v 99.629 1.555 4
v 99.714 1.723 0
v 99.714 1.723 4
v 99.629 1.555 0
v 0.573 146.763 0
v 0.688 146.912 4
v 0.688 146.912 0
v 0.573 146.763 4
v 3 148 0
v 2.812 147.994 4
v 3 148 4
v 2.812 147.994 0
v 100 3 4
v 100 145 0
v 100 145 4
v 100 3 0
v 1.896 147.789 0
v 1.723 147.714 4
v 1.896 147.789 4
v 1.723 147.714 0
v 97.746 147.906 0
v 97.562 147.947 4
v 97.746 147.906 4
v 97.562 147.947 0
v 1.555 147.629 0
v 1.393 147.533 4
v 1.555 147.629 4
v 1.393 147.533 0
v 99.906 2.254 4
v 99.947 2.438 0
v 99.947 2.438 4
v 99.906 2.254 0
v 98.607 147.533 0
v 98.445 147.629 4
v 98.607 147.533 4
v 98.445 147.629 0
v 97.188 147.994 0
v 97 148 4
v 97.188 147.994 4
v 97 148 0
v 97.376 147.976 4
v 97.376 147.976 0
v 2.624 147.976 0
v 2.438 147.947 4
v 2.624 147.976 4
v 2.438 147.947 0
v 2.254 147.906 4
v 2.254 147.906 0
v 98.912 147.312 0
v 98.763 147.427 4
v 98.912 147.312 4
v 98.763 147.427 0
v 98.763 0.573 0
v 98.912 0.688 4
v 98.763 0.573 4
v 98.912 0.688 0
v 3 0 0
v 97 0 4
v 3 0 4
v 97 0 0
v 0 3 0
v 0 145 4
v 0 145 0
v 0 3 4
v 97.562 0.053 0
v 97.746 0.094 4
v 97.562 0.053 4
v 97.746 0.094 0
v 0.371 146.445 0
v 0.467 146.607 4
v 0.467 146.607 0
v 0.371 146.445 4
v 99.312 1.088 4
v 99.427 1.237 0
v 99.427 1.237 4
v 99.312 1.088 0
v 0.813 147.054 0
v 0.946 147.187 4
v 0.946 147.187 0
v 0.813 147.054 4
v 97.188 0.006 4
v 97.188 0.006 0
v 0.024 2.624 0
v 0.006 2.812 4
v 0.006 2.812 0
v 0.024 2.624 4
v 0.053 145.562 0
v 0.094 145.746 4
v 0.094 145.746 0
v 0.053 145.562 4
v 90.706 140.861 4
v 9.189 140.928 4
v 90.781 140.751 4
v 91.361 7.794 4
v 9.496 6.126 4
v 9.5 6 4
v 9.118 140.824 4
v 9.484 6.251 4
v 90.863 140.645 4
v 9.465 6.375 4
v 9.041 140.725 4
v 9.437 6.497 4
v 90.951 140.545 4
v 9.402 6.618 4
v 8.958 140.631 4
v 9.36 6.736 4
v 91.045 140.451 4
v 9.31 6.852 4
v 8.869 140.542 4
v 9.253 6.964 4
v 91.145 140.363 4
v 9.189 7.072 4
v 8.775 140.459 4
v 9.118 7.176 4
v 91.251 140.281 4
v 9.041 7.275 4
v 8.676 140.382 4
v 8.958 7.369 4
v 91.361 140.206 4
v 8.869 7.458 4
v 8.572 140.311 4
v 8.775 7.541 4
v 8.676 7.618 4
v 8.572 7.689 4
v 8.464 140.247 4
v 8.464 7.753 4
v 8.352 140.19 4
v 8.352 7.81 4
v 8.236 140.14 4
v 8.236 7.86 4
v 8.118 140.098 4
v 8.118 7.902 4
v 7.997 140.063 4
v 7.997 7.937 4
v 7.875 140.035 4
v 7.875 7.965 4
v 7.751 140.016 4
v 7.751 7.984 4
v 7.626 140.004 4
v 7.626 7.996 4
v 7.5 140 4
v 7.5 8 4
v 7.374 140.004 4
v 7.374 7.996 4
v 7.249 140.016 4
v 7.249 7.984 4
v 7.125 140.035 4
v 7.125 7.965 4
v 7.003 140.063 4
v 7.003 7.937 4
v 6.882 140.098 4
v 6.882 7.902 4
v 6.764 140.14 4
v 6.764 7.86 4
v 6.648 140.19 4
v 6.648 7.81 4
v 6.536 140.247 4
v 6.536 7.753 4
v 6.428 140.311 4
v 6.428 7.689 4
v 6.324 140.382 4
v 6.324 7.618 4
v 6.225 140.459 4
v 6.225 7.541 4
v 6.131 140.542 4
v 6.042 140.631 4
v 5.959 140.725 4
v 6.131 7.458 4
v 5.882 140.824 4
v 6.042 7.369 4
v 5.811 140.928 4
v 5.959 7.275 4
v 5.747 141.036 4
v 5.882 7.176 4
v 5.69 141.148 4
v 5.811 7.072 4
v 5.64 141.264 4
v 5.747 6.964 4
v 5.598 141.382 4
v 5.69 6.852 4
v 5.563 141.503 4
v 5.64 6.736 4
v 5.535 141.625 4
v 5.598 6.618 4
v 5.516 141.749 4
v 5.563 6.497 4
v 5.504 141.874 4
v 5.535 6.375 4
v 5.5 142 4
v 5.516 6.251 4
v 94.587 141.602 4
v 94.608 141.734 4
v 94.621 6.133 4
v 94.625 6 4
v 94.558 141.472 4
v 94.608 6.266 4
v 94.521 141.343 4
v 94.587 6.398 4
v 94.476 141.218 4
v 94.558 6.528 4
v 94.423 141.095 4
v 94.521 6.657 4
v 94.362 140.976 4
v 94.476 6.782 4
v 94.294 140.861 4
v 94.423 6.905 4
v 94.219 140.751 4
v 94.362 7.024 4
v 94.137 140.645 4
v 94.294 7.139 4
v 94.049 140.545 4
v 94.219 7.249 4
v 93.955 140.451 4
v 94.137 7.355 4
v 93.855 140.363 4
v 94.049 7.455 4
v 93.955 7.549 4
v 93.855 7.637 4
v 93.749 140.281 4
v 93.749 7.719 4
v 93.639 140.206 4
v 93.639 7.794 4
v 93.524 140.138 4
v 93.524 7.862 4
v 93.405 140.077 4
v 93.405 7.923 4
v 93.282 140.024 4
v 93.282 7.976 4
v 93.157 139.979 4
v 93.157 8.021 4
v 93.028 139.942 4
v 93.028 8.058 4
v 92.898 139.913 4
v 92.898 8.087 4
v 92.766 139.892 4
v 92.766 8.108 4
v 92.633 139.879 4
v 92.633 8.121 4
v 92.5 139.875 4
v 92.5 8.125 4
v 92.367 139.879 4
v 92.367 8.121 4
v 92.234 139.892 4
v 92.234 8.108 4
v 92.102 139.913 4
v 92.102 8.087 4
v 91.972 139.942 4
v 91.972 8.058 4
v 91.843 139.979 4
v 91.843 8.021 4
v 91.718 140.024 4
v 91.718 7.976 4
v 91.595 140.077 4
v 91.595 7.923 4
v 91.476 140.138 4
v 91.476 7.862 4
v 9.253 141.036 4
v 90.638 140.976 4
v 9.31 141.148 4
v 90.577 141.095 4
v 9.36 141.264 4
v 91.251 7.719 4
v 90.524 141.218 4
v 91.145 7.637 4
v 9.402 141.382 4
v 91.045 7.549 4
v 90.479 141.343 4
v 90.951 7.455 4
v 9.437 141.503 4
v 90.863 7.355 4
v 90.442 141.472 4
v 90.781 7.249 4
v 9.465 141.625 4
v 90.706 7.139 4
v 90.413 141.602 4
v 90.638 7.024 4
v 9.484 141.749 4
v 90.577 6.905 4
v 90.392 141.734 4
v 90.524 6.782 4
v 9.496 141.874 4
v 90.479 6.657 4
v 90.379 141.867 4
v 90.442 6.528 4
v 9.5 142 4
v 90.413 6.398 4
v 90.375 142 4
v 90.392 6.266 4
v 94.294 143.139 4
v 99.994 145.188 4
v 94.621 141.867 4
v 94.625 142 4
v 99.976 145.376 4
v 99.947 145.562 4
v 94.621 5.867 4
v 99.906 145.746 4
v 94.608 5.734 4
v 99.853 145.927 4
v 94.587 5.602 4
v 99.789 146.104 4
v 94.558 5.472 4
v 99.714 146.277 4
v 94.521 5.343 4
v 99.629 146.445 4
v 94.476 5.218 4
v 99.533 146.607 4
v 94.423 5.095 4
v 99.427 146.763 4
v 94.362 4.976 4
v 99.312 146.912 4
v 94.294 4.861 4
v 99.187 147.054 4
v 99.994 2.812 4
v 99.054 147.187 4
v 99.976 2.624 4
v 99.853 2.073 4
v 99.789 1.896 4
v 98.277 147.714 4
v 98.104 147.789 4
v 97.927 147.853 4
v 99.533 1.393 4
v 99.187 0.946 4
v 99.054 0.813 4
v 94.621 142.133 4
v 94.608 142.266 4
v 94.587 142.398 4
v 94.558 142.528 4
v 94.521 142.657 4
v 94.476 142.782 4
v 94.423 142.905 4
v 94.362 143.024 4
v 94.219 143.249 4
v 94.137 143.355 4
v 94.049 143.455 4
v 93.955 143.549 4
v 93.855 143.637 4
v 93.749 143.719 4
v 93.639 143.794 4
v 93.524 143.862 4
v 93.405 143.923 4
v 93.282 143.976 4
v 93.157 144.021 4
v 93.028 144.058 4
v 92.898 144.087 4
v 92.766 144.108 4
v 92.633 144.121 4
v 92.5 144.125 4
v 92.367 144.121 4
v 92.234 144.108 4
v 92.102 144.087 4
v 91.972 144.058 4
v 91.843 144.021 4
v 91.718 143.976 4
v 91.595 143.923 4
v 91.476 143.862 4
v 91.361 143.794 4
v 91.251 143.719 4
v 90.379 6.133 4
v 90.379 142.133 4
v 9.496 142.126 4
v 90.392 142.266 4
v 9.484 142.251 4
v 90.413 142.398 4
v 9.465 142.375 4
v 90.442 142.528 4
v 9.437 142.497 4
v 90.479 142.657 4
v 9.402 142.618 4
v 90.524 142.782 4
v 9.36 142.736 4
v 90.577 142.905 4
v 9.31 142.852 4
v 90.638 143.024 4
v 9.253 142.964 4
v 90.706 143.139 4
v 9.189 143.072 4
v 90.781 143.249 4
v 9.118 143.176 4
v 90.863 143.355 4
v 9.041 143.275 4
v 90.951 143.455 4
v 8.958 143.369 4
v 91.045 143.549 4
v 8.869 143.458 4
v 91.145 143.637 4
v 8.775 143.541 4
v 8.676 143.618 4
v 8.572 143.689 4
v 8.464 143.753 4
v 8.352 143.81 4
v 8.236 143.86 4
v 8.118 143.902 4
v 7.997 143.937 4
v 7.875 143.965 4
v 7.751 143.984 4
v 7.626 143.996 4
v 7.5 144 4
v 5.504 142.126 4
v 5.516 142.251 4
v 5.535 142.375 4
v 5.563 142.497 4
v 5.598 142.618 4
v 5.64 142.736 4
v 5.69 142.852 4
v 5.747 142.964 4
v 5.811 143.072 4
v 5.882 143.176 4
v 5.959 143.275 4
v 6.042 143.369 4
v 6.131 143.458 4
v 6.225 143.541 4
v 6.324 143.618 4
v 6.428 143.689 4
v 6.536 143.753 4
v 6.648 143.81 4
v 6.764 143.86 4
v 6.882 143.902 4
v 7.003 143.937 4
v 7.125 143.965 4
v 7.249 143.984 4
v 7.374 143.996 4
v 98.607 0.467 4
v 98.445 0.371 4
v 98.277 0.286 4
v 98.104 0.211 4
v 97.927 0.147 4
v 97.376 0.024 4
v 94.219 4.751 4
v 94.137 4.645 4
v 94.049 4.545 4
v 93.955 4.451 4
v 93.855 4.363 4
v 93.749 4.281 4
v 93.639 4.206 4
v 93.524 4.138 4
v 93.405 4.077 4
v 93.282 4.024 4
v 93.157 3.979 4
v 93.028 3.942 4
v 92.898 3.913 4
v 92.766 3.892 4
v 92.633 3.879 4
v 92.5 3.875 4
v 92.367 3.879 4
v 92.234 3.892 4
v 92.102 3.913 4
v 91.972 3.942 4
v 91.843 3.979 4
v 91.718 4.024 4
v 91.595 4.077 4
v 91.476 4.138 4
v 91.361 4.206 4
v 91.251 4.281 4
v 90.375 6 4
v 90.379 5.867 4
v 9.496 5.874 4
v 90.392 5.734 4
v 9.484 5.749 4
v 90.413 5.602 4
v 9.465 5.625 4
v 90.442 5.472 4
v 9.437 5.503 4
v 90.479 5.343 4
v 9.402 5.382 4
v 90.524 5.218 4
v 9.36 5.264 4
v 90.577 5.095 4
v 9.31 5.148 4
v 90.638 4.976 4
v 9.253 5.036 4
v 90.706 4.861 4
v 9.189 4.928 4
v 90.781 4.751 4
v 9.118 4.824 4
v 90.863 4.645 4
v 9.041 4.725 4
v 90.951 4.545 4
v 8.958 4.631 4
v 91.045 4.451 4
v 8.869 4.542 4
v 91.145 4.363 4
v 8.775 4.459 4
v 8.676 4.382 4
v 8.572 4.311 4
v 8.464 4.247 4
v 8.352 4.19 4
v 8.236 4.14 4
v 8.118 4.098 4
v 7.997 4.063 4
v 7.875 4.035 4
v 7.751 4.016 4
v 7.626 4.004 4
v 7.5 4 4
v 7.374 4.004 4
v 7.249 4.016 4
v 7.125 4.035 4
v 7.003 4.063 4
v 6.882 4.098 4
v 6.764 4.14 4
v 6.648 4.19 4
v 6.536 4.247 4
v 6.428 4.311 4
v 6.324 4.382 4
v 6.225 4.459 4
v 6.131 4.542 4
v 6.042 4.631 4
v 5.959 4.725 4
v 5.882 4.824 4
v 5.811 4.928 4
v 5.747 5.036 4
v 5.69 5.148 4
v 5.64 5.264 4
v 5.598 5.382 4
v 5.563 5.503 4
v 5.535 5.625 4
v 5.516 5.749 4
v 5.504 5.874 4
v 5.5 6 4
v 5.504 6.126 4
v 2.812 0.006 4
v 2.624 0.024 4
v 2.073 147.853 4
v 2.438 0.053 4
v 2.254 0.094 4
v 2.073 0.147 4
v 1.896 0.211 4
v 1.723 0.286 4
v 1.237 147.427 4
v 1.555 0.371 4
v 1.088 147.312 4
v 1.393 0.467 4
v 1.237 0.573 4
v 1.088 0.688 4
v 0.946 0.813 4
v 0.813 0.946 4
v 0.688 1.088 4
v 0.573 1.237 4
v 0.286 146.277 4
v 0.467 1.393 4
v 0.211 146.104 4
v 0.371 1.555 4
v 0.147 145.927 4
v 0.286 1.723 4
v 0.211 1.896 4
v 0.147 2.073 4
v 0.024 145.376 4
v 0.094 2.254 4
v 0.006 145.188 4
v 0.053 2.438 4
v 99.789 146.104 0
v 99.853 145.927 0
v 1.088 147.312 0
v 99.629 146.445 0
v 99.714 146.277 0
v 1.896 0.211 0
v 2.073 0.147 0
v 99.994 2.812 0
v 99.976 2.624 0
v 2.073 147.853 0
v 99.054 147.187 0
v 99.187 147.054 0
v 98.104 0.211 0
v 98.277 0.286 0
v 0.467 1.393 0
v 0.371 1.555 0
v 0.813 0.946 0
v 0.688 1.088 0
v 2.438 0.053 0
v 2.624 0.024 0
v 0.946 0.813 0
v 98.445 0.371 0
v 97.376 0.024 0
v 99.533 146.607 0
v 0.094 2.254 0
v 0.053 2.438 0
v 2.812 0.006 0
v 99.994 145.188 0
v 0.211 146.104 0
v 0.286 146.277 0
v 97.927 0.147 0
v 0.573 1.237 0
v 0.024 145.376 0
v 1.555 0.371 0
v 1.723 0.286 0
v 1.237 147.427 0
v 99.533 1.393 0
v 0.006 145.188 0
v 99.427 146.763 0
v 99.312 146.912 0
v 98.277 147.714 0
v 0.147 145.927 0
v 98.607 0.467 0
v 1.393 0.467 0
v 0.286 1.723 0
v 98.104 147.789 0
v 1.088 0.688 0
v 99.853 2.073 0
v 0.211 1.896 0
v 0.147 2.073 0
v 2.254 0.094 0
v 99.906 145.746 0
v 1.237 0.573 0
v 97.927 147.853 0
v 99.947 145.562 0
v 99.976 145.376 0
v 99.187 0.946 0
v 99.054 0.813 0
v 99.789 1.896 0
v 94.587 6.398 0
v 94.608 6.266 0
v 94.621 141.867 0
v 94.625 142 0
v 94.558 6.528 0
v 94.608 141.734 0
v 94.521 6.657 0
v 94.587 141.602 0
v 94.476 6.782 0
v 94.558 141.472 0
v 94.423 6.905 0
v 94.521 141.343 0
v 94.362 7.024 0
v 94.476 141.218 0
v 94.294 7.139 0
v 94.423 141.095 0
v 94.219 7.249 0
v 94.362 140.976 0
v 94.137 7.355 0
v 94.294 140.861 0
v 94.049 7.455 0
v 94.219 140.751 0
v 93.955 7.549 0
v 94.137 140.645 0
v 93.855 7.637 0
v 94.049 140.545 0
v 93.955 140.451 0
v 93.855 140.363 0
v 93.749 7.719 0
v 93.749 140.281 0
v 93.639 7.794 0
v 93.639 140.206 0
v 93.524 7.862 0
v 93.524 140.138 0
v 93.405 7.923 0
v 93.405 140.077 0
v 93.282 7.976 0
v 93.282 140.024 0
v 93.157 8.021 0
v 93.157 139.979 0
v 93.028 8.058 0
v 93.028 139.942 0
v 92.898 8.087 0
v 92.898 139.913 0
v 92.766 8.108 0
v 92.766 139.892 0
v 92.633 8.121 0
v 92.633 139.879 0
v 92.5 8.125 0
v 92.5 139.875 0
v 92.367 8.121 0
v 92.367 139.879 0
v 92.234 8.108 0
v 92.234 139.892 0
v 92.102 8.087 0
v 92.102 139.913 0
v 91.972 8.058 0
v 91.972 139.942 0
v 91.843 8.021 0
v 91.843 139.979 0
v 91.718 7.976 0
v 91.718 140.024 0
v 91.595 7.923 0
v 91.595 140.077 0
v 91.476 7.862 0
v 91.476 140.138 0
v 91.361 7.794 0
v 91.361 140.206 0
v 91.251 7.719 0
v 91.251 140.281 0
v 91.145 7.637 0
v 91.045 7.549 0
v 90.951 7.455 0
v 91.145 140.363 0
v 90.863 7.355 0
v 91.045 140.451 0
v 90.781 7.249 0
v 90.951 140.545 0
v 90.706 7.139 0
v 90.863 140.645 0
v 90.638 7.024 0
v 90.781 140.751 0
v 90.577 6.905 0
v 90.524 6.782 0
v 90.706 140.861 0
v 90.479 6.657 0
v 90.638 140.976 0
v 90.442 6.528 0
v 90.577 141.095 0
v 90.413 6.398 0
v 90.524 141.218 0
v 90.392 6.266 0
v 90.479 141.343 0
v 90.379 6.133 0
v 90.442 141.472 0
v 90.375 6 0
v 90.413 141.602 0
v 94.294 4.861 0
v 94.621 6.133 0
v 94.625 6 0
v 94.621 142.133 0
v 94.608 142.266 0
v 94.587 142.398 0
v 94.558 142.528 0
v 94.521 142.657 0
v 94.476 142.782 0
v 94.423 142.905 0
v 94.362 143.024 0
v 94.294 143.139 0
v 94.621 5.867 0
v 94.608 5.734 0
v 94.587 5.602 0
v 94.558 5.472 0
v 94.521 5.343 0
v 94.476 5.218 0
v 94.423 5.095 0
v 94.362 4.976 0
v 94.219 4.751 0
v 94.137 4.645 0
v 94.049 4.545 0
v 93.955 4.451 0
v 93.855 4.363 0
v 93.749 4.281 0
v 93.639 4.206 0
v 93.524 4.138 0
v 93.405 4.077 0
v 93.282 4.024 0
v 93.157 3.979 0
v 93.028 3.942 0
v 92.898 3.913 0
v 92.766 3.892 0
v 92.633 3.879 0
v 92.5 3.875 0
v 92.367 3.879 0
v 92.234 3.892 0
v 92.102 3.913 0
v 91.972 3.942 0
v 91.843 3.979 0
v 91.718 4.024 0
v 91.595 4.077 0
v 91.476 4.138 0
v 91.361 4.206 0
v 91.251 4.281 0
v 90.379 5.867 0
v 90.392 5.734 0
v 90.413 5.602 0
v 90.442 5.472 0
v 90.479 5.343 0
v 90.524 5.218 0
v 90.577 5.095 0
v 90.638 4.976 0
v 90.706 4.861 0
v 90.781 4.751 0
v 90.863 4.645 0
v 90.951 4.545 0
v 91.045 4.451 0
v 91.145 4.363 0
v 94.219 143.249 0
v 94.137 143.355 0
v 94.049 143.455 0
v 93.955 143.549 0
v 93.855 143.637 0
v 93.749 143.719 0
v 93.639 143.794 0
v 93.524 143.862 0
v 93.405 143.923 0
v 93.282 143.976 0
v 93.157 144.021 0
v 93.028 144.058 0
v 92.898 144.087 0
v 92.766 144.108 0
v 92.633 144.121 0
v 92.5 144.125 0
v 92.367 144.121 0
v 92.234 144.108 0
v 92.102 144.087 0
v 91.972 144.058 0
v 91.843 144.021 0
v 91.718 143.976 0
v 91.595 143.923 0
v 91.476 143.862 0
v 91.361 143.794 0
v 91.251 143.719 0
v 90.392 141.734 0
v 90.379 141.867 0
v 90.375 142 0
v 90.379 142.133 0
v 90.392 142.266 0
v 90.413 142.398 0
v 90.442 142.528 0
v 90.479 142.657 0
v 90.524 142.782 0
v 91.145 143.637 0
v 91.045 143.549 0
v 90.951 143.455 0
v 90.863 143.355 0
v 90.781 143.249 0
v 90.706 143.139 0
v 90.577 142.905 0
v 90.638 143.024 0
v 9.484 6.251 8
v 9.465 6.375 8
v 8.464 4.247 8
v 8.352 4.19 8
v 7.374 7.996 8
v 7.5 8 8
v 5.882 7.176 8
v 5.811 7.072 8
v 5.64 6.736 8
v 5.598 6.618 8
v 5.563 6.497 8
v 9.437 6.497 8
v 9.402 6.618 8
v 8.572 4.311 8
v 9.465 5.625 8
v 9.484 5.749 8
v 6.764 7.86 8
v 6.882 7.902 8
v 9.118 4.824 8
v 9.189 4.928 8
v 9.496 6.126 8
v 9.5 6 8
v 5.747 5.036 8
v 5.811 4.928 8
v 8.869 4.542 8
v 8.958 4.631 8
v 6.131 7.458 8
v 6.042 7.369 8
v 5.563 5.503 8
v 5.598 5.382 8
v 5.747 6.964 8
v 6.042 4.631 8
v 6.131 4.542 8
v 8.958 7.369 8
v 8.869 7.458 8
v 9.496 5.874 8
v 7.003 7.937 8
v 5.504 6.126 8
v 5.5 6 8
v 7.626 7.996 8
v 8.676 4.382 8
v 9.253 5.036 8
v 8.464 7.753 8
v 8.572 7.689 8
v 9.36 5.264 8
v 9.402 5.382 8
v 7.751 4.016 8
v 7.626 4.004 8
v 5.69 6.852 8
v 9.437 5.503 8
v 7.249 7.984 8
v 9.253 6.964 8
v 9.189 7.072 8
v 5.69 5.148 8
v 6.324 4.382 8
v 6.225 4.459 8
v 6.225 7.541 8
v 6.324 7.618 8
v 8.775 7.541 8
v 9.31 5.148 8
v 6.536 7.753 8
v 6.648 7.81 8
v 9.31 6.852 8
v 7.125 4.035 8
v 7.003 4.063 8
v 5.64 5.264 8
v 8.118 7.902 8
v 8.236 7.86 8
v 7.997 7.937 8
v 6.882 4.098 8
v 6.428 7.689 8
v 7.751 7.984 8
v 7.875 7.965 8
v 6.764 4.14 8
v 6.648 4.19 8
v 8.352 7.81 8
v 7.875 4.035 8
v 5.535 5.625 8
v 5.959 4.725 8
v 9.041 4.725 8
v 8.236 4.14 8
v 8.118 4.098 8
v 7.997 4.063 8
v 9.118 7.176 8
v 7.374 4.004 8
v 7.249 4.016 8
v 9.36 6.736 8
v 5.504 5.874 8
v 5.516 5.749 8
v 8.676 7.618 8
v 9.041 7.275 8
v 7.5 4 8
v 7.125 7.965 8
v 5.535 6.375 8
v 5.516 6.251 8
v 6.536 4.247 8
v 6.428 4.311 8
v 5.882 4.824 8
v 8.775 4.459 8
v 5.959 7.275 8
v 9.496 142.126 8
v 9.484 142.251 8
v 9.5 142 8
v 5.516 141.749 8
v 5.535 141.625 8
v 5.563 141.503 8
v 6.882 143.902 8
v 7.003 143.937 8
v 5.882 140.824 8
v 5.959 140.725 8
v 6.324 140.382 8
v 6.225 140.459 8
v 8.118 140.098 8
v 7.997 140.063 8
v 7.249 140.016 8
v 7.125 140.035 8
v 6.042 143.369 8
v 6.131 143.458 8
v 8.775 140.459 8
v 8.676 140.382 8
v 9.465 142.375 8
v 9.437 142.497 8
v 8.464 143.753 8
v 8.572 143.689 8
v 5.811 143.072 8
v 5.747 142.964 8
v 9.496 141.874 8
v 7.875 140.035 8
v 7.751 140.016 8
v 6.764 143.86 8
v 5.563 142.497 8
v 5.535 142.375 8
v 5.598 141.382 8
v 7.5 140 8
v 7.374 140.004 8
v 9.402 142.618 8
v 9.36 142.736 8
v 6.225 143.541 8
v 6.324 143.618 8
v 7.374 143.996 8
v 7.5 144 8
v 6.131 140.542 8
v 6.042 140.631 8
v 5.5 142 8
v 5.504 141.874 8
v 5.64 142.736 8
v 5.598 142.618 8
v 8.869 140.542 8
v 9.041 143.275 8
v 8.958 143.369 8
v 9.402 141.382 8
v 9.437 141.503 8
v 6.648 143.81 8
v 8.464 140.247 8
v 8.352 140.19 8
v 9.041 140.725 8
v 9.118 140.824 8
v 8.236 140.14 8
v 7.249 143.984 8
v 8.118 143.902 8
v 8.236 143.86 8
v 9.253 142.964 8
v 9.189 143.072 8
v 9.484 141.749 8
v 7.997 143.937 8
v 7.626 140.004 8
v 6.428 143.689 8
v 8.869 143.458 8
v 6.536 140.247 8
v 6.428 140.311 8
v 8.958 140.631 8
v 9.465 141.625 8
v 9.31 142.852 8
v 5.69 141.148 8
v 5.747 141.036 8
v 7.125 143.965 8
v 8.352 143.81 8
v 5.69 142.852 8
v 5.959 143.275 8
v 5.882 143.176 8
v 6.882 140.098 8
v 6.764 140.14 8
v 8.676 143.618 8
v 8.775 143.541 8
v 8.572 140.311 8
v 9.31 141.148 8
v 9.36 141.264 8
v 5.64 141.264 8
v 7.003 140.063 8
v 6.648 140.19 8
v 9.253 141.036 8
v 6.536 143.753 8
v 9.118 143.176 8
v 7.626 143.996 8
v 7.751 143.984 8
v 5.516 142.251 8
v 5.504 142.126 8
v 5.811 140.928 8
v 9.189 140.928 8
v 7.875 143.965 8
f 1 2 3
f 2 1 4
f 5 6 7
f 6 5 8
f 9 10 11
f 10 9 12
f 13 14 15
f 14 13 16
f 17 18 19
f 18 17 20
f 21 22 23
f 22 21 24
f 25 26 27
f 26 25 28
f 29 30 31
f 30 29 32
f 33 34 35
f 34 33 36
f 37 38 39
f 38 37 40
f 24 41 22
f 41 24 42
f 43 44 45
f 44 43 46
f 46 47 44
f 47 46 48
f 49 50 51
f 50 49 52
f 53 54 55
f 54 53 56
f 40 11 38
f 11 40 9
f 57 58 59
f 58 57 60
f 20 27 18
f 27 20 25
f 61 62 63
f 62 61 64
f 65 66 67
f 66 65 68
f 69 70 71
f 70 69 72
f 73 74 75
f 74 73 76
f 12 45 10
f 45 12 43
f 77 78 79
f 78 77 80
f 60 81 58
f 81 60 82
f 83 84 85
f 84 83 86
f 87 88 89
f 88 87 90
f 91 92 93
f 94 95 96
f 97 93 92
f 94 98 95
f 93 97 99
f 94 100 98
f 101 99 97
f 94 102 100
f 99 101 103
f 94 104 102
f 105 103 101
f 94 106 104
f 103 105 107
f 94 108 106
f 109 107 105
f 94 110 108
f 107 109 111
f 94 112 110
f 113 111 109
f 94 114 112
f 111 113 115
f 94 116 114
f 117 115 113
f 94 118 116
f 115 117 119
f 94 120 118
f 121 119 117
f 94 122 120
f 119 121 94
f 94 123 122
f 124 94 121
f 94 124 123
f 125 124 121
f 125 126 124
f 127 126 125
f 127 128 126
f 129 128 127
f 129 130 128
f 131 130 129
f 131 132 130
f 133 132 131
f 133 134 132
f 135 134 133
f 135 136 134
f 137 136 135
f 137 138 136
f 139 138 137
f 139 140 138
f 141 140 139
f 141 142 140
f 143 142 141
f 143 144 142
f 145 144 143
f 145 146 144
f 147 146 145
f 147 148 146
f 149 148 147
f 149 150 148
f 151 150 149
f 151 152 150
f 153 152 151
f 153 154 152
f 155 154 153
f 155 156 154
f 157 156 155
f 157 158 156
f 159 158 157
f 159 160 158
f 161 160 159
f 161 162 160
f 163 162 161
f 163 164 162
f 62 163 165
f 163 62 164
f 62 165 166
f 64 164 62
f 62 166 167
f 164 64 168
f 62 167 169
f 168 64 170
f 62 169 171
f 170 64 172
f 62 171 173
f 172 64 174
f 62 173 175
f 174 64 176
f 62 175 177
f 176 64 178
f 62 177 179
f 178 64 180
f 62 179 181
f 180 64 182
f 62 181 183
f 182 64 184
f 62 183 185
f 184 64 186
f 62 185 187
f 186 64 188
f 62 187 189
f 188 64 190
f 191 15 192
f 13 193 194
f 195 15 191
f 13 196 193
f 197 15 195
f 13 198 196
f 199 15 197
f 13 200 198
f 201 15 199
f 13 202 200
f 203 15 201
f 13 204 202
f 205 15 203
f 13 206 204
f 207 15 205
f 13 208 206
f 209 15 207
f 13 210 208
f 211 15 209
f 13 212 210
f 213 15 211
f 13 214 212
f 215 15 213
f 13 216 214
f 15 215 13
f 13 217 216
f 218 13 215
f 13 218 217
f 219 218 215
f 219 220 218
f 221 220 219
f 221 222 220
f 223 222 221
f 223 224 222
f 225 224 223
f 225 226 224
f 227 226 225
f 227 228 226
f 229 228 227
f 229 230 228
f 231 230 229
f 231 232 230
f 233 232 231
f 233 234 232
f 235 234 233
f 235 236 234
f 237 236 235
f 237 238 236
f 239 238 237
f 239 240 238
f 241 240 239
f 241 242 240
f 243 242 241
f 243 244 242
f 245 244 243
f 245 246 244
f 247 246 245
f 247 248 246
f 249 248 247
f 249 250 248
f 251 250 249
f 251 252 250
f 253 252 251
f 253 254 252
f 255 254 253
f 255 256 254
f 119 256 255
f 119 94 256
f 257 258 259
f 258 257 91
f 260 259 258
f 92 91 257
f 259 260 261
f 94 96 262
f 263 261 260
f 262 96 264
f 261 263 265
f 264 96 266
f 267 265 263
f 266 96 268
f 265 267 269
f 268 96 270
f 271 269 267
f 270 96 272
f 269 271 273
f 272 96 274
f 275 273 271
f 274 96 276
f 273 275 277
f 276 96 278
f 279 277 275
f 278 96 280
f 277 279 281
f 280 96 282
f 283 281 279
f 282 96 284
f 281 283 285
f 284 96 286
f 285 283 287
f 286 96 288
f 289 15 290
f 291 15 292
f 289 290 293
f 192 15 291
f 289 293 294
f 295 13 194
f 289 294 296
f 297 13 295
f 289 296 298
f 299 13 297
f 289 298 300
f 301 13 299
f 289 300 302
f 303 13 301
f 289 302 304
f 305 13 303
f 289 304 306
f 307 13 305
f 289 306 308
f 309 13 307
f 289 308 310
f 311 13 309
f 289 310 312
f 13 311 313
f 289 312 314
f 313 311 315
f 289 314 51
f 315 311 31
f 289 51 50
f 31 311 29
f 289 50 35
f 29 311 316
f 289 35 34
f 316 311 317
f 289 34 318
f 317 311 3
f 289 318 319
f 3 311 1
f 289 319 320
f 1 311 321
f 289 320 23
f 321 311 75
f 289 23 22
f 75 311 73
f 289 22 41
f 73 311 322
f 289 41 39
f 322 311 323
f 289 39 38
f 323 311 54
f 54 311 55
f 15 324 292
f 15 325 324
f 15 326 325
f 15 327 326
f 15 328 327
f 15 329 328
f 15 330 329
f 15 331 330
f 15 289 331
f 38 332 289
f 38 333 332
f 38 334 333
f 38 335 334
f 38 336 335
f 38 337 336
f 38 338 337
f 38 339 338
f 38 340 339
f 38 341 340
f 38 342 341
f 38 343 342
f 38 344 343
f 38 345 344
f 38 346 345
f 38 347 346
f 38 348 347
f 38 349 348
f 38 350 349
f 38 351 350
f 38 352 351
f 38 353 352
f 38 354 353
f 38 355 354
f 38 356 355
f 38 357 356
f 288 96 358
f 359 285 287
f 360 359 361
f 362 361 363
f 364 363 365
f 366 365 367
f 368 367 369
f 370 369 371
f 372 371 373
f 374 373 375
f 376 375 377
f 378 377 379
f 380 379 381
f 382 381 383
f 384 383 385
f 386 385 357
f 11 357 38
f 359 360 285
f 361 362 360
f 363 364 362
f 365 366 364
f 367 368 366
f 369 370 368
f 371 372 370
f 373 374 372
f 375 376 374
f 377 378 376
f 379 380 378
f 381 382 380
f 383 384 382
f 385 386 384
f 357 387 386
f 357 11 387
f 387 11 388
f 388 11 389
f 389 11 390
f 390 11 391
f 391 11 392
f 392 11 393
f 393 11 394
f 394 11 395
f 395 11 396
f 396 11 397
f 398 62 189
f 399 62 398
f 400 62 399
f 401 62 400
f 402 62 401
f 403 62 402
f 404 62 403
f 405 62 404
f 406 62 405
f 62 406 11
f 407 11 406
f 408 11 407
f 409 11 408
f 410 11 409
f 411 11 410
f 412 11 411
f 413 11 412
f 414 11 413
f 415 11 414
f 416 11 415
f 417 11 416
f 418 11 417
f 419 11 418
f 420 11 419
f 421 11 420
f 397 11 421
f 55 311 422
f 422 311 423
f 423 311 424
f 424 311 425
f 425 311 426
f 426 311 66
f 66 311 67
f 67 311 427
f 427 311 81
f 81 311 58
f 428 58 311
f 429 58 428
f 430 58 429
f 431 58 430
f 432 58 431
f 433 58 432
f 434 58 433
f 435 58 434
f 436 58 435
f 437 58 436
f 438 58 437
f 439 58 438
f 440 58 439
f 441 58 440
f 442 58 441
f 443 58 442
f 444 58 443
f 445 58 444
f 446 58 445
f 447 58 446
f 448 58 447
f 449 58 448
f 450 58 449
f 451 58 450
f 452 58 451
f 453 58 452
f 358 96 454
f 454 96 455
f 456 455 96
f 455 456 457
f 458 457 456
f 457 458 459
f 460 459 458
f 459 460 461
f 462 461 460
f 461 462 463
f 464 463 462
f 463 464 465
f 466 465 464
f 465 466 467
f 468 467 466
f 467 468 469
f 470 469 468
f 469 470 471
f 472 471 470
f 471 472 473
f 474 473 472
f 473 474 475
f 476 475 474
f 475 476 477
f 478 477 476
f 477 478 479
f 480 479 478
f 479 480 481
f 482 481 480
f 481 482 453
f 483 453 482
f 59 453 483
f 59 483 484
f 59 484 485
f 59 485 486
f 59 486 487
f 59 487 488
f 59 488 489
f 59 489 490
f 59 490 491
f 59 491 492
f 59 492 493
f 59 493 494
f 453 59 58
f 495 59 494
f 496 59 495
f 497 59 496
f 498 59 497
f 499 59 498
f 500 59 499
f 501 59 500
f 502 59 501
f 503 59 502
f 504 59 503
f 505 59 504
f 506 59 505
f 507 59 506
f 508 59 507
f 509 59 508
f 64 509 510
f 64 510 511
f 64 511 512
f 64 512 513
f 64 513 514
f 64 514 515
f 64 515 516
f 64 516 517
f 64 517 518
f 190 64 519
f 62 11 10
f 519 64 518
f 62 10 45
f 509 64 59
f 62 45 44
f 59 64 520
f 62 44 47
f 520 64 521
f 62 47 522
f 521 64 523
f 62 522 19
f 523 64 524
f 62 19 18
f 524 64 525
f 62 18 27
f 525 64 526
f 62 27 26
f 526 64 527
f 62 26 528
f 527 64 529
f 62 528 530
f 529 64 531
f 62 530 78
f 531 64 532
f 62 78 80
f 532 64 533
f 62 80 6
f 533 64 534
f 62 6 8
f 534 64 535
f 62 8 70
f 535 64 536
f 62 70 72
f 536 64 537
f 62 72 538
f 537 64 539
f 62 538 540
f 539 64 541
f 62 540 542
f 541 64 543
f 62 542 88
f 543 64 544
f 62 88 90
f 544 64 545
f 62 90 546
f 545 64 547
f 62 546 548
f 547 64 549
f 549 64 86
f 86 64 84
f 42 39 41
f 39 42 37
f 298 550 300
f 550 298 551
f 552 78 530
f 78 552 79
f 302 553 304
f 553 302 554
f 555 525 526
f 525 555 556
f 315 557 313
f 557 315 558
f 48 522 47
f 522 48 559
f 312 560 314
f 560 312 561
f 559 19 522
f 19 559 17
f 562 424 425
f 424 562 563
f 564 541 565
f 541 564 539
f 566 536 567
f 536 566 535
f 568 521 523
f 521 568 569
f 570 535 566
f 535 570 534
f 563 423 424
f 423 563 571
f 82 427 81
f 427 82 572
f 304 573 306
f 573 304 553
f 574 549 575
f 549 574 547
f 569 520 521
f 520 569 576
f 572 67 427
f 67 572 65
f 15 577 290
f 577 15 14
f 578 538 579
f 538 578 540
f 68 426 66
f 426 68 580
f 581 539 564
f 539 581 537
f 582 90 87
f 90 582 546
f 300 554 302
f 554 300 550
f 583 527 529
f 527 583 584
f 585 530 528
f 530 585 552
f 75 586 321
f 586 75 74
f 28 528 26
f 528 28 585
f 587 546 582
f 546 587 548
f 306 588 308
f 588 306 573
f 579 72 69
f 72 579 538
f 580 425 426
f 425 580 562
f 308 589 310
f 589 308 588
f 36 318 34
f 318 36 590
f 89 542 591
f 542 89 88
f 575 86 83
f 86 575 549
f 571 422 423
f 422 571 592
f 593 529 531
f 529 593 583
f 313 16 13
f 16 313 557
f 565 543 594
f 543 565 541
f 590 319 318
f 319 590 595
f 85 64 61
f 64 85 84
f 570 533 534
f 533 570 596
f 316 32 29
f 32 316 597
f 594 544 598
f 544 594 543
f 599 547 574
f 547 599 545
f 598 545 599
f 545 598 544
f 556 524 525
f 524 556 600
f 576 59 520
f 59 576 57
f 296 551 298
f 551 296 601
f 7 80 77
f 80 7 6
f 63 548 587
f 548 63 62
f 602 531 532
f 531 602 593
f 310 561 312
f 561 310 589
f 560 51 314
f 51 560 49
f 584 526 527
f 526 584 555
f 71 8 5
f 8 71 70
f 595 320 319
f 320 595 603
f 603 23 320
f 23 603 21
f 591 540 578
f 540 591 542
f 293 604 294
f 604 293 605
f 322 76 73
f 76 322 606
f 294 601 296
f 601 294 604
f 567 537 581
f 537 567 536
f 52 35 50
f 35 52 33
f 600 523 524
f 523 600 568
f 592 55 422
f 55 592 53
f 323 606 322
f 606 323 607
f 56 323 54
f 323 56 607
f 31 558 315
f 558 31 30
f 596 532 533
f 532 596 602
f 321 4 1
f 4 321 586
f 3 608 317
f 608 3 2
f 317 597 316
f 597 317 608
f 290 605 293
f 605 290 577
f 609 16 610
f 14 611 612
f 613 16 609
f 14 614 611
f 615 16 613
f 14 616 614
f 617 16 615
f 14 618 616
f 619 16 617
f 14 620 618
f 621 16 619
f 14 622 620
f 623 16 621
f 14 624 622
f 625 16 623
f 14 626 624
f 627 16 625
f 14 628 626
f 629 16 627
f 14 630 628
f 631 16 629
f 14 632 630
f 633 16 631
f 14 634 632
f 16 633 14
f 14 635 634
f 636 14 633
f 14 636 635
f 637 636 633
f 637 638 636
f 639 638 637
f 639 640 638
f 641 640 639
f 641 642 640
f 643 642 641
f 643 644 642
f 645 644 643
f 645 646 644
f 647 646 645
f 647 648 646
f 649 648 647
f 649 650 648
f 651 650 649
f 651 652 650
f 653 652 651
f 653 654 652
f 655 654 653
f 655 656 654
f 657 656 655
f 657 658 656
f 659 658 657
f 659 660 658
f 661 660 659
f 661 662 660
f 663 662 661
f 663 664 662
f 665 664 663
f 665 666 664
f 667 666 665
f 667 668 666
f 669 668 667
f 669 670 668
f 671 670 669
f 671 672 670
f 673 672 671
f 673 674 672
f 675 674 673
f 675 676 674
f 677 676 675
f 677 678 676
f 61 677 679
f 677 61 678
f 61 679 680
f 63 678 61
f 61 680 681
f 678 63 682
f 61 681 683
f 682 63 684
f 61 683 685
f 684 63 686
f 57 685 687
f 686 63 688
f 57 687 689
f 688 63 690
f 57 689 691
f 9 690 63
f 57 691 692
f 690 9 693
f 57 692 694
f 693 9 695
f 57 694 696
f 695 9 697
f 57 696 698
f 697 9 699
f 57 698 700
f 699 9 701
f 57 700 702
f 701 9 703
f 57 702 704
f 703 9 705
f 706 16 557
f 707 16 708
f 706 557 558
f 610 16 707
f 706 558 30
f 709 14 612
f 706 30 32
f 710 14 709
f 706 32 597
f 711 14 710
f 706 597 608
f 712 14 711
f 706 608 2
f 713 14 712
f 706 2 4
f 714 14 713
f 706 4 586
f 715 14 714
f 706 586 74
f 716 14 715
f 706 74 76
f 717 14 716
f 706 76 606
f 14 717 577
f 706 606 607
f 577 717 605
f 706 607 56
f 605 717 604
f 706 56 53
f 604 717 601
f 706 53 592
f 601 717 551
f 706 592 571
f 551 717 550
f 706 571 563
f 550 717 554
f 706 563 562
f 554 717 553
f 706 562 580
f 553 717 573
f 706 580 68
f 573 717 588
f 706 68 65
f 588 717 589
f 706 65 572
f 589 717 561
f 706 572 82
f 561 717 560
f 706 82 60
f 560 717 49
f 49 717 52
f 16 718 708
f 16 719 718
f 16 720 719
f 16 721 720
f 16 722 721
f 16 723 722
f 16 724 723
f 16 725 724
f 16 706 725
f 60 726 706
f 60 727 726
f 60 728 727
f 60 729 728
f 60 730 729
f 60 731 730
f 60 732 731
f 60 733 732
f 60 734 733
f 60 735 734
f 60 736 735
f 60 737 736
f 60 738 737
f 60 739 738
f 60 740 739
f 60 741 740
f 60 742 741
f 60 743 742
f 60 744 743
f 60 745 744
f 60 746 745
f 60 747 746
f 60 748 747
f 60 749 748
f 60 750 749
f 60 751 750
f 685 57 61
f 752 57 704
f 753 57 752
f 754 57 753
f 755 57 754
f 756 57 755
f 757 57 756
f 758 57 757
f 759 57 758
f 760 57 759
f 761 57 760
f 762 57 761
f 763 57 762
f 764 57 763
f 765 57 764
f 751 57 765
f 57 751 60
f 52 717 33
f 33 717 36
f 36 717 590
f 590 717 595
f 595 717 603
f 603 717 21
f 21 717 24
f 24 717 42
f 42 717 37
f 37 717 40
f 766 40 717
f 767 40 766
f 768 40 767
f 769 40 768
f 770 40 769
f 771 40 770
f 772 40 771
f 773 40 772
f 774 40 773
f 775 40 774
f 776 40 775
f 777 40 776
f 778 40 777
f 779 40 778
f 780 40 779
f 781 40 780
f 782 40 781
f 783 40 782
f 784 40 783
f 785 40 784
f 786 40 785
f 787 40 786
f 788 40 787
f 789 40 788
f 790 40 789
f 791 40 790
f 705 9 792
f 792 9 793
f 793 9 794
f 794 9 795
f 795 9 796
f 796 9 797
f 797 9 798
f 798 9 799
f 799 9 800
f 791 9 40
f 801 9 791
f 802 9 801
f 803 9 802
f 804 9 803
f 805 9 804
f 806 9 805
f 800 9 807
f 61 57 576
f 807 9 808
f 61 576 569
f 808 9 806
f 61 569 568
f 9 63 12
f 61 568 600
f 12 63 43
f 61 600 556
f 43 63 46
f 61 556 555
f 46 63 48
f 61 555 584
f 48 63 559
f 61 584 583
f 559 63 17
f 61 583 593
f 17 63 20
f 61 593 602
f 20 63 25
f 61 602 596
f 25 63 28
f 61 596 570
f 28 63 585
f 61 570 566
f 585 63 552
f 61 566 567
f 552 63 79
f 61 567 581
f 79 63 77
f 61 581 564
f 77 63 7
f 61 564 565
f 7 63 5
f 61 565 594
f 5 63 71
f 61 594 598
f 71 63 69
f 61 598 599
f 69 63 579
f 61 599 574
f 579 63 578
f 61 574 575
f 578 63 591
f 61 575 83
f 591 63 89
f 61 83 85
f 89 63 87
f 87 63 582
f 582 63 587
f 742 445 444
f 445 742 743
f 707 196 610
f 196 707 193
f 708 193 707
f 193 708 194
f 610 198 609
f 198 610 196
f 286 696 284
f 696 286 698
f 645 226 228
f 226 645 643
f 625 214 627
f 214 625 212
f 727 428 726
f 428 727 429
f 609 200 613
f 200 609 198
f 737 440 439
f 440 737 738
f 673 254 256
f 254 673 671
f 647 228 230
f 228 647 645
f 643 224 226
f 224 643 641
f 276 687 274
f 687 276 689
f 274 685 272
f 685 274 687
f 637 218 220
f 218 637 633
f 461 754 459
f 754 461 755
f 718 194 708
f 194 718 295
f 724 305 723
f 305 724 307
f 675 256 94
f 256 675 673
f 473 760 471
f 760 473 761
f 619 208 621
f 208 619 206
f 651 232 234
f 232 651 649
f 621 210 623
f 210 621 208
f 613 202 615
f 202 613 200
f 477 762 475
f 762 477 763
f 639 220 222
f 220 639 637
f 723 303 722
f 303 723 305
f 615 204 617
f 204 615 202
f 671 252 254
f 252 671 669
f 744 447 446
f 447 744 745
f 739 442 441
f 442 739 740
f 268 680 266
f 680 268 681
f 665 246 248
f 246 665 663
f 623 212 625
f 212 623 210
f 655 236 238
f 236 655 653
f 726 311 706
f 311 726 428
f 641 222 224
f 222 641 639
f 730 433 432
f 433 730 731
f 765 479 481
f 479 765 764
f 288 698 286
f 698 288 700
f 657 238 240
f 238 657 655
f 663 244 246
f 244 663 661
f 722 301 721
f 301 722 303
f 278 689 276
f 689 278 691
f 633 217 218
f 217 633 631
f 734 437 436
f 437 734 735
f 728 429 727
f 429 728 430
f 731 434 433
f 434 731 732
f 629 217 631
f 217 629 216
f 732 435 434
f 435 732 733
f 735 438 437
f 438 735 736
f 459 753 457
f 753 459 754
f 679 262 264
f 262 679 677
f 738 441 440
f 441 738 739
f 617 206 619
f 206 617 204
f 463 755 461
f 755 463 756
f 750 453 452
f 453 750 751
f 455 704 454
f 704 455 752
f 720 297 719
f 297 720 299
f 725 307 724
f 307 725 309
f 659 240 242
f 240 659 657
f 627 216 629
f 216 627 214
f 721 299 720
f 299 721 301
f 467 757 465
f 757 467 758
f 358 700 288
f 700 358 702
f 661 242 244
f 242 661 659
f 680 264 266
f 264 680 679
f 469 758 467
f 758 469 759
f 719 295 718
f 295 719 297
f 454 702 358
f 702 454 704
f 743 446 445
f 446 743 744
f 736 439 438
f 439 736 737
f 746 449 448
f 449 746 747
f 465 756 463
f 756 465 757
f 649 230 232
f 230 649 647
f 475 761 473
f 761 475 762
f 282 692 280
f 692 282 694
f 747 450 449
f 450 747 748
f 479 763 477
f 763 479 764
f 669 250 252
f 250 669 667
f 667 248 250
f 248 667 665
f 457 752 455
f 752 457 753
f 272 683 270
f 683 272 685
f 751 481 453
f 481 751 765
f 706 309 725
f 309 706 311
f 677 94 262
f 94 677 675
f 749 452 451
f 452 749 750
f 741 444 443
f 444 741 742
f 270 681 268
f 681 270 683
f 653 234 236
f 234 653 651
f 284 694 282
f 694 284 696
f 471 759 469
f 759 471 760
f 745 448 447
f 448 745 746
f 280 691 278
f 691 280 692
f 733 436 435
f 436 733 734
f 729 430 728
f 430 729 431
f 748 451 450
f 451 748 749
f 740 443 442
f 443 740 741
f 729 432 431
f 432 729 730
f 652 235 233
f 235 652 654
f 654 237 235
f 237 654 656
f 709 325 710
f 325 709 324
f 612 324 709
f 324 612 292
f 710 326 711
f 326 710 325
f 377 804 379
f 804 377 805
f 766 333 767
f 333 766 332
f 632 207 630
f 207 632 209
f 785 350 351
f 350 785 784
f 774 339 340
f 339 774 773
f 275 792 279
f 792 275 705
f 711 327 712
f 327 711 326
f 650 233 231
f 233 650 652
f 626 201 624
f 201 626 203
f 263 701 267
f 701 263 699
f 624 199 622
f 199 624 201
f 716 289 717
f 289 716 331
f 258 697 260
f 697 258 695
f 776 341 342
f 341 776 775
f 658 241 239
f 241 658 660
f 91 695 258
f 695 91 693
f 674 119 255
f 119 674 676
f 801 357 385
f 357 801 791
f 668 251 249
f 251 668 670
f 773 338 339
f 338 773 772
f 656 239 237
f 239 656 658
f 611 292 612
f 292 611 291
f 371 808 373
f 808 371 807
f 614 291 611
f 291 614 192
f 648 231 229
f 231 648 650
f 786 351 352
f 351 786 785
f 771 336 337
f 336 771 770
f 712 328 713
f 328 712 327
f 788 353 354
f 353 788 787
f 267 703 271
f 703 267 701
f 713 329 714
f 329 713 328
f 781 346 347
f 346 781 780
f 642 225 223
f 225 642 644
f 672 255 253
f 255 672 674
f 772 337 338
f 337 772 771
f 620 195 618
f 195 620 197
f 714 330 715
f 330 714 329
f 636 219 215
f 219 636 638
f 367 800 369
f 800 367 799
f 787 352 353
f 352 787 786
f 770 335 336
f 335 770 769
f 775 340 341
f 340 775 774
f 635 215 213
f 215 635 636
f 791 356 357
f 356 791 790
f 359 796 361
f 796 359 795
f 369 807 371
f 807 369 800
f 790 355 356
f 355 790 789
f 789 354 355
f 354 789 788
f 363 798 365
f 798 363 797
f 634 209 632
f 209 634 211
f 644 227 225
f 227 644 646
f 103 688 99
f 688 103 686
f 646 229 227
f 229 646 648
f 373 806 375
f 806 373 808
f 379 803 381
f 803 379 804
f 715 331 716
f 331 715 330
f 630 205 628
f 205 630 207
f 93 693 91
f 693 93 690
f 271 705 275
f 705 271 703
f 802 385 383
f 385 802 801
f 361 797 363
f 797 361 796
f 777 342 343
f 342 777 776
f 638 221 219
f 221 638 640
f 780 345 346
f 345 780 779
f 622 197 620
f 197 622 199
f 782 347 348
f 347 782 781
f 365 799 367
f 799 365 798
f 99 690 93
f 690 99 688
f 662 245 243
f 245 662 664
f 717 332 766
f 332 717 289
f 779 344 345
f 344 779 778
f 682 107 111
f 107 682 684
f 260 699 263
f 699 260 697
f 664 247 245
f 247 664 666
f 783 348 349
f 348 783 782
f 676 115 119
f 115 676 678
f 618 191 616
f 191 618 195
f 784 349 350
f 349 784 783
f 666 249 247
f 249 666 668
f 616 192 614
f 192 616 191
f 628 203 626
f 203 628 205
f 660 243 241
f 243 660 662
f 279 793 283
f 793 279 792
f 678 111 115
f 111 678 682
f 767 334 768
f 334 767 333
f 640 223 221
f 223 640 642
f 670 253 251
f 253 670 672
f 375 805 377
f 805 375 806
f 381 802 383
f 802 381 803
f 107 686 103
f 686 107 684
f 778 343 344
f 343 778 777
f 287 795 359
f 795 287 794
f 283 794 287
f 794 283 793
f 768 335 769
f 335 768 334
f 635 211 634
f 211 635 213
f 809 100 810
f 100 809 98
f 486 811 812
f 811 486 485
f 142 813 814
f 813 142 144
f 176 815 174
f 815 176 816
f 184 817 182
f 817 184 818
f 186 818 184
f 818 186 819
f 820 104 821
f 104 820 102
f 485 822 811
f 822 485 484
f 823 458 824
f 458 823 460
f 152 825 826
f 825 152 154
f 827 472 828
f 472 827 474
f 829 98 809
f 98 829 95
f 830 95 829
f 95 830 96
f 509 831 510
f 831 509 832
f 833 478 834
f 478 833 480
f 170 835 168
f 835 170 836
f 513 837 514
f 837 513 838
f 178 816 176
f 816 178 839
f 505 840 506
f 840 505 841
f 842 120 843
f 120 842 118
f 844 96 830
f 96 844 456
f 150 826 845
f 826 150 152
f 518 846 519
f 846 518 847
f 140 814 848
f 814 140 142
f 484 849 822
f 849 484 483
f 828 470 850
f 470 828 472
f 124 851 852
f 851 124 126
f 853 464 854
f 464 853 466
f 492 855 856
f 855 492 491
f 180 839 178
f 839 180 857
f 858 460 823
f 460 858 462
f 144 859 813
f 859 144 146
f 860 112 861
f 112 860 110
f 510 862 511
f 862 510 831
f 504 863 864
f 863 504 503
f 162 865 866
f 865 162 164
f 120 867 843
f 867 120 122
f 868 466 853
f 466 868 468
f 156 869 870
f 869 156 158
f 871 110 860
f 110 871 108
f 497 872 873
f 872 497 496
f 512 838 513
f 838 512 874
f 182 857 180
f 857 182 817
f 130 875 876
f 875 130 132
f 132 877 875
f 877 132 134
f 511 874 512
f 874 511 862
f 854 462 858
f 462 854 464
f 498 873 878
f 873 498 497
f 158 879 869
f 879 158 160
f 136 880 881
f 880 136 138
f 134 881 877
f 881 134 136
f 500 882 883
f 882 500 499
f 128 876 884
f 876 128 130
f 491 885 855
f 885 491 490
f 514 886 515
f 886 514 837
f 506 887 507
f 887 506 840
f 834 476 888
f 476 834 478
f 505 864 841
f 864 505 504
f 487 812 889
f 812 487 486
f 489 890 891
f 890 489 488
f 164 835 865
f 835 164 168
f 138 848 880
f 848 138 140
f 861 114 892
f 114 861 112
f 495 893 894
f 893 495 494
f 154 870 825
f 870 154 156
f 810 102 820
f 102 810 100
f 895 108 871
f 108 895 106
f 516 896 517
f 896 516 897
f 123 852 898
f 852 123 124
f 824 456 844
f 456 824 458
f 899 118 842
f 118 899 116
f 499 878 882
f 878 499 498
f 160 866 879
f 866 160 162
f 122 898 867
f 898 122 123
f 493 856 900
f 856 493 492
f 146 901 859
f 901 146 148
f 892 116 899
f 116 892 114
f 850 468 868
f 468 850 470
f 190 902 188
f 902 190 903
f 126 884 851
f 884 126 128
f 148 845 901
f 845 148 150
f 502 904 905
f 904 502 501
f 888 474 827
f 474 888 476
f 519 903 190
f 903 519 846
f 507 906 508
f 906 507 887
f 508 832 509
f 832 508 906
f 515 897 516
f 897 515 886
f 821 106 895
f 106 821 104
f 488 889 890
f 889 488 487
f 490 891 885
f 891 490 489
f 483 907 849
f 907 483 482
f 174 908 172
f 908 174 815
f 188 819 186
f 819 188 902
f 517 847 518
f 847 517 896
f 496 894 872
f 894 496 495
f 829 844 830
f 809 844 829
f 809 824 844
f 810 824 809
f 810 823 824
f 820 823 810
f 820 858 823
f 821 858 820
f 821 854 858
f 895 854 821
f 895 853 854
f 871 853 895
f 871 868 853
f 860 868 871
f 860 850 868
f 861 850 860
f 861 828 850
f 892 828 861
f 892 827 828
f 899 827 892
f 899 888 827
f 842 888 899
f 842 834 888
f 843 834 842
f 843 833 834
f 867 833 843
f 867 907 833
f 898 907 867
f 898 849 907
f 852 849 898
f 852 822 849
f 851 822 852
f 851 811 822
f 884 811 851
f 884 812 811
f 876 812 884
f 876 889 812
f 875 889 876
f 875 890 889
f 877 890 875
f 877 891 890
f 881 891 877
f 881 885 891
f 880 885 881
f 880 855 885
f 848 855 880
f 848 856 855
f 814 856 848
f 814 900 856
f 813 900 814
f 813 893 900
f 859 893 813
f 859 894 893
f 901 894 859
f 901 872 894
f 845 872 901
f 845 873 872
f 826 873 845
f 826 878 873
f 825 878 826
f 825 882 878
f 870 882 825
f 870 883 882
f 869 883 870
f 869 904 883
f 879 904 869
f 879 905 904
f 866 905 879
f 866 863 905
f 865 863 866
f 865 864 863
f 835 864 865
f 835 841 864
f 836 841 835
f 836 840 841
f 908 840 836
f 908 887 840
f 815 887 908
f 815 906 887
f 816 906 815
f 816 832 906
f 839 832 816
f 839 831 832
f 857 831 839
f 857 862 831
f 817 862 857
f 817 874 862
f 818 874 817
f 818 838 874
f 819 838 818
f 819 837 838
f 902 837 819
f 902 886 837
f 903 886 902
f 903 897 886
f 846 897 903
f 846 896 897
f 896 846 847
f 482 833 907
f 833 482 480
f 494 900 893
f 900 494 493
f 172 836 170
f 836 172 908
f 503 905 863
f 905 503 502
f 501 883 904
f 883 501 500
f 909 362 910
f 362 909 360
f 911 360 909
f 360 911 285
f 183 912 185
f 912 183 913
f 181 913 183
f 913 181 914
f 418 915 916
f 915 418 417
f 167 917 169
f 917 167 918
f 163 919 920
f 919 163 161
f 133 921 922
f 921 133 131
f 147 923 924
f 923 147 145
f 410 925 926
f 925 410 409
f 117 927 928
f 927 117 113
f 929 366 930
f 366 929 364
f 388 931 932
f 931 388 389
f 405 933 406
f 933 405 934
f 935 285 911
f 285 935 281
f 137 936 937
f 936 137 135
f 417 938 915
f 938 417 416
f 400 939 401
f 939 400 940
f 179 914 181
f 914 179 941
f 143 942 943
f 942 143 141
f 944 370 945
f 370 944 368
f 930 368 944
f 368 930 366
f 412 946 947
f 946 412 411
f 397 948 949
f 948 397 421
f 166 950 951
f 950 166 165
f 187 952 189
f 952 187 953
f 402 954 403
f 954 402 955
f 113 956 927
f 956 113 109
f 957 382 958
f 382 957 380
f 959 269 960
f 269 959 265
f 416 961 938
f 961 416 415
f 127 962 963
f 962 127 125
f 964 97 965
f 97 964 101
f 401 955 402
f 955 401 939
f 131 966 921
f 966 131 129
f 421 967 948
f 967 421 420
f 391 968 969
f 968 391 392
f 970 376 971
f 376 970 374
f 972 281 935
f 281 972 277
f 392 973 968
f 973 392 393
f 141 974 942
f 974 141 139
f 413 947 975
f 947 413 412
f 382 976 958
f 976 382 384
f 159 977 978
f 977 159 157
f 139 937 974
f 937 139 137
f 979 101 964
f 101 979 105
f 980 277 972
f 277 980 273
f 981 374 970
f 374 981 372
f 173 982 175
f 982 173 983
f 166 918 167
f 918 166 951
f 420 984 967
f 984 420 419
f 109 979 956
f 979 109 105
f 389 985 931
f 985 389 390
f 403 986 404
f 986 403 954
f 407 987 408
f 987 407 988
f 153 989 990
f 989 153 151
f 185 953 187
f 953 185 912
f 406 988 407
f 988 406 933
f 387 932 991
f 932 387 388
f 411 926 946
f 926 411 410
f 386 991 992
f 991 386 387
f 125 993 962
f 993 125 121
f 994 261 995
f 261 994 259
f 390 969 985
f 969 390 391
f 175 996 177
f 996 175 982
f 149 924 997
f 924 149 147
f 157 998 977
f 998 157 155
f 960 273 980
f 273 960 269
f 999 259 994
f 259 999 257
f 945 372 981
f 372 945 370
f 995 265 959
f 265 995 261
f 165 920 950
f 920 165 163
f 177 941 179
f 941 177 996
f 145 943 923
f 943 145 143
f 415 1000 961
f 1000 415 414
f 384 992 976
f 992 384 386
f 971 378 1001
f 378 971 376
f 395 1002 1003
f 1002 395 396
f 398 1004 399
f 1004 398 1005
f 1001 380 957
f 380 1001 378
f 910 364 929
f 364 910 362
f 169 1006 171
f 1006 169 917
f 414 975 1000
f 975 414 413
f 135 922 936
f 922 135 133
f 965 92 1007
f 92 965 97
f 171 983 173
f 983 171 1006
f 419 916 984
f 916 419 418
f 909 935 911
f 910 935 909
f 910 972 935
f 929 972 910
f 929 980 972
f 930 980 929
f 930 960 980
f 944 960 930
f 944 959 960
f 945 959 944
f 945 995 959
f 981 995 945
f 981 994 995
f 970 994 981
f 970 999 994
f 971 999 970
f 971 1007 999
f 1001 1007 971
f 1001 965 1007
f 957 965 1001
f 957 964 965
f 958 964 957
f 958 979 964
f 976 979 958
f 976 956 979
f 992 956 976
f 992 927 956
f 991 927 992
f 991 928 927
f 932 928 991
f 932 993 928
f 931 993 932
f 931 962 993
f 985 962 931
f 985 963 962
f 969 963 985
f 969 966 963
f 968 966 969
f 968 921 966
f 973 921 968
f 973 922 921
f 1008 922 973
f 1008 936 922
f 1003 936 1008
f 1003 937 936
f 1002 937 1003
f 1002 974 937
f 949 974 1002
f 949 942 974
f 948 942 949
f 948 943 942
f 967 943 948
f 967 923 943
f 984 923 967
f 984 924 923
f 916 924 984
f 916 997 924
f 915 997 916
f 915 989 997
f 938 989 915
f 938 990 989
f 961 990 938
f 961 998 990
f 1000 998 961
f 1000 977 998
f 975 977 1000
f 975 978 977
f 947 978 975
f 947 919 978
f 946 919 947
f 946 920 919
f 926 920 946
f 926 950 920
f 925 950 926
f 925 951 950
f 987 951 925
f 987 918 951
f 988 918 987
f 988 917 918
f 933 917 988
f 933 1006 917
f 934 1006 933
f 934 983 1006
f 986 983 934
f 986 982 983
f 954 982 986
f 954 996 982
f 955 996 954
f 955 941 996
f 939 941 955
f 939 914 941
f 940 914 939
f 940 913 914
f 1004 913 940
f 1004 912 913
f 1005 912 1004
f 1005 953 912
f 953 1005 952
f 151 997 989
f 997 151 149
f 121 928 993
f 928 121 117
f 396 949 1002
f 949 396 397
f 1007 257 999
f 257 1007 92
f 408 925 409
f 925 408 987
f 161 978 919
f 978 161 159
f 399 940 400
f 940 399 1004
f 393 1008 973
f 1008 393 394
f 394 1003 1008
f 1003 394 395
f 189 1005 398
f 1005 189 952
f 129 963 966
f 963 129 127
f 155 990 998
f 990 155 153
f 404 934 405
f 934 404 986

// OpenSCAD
// for the V1 40-flap modules

$fn=100;

distance_between_module_center = 85;

overall_width = 100;
overall_height = 148;
depth = 4;
cutaway_dia = 4.25;
extrude_dia = 4;

start_hole_offset = (overall_width - distance_between_module_center) / 2;

module rounded_cube(x,y,z)
{
    r=3;
    translate([r,r,0])
    minkowski() {
        cube([x-(2*r), y-(2*r), z-r]);
        cylinder(r,r,r);
    }
}

module splitflap_screwhole(x, y, z, dia)
{
    translate([x,y,z])
        cylinder(h=depth, d=dia);
}


difference()
{
    
    rounded_cube(overall_width, overall_height, depth);
    
    splitflap_screwhole(start_hole_offset+distance_between_module_center, 6, 0, cutaway_dia);
    splitflap_screwhole(start_hole_offset+distance_between_module_center, overall_height - 6, 0, cutaway_dia);
}

splitflap_screwhole(start_hole_offset, 6, depth, extrude_dia);
splitflap_screwhole(start_hole_offset, overall_height - 6, depth, extrude_dia);
